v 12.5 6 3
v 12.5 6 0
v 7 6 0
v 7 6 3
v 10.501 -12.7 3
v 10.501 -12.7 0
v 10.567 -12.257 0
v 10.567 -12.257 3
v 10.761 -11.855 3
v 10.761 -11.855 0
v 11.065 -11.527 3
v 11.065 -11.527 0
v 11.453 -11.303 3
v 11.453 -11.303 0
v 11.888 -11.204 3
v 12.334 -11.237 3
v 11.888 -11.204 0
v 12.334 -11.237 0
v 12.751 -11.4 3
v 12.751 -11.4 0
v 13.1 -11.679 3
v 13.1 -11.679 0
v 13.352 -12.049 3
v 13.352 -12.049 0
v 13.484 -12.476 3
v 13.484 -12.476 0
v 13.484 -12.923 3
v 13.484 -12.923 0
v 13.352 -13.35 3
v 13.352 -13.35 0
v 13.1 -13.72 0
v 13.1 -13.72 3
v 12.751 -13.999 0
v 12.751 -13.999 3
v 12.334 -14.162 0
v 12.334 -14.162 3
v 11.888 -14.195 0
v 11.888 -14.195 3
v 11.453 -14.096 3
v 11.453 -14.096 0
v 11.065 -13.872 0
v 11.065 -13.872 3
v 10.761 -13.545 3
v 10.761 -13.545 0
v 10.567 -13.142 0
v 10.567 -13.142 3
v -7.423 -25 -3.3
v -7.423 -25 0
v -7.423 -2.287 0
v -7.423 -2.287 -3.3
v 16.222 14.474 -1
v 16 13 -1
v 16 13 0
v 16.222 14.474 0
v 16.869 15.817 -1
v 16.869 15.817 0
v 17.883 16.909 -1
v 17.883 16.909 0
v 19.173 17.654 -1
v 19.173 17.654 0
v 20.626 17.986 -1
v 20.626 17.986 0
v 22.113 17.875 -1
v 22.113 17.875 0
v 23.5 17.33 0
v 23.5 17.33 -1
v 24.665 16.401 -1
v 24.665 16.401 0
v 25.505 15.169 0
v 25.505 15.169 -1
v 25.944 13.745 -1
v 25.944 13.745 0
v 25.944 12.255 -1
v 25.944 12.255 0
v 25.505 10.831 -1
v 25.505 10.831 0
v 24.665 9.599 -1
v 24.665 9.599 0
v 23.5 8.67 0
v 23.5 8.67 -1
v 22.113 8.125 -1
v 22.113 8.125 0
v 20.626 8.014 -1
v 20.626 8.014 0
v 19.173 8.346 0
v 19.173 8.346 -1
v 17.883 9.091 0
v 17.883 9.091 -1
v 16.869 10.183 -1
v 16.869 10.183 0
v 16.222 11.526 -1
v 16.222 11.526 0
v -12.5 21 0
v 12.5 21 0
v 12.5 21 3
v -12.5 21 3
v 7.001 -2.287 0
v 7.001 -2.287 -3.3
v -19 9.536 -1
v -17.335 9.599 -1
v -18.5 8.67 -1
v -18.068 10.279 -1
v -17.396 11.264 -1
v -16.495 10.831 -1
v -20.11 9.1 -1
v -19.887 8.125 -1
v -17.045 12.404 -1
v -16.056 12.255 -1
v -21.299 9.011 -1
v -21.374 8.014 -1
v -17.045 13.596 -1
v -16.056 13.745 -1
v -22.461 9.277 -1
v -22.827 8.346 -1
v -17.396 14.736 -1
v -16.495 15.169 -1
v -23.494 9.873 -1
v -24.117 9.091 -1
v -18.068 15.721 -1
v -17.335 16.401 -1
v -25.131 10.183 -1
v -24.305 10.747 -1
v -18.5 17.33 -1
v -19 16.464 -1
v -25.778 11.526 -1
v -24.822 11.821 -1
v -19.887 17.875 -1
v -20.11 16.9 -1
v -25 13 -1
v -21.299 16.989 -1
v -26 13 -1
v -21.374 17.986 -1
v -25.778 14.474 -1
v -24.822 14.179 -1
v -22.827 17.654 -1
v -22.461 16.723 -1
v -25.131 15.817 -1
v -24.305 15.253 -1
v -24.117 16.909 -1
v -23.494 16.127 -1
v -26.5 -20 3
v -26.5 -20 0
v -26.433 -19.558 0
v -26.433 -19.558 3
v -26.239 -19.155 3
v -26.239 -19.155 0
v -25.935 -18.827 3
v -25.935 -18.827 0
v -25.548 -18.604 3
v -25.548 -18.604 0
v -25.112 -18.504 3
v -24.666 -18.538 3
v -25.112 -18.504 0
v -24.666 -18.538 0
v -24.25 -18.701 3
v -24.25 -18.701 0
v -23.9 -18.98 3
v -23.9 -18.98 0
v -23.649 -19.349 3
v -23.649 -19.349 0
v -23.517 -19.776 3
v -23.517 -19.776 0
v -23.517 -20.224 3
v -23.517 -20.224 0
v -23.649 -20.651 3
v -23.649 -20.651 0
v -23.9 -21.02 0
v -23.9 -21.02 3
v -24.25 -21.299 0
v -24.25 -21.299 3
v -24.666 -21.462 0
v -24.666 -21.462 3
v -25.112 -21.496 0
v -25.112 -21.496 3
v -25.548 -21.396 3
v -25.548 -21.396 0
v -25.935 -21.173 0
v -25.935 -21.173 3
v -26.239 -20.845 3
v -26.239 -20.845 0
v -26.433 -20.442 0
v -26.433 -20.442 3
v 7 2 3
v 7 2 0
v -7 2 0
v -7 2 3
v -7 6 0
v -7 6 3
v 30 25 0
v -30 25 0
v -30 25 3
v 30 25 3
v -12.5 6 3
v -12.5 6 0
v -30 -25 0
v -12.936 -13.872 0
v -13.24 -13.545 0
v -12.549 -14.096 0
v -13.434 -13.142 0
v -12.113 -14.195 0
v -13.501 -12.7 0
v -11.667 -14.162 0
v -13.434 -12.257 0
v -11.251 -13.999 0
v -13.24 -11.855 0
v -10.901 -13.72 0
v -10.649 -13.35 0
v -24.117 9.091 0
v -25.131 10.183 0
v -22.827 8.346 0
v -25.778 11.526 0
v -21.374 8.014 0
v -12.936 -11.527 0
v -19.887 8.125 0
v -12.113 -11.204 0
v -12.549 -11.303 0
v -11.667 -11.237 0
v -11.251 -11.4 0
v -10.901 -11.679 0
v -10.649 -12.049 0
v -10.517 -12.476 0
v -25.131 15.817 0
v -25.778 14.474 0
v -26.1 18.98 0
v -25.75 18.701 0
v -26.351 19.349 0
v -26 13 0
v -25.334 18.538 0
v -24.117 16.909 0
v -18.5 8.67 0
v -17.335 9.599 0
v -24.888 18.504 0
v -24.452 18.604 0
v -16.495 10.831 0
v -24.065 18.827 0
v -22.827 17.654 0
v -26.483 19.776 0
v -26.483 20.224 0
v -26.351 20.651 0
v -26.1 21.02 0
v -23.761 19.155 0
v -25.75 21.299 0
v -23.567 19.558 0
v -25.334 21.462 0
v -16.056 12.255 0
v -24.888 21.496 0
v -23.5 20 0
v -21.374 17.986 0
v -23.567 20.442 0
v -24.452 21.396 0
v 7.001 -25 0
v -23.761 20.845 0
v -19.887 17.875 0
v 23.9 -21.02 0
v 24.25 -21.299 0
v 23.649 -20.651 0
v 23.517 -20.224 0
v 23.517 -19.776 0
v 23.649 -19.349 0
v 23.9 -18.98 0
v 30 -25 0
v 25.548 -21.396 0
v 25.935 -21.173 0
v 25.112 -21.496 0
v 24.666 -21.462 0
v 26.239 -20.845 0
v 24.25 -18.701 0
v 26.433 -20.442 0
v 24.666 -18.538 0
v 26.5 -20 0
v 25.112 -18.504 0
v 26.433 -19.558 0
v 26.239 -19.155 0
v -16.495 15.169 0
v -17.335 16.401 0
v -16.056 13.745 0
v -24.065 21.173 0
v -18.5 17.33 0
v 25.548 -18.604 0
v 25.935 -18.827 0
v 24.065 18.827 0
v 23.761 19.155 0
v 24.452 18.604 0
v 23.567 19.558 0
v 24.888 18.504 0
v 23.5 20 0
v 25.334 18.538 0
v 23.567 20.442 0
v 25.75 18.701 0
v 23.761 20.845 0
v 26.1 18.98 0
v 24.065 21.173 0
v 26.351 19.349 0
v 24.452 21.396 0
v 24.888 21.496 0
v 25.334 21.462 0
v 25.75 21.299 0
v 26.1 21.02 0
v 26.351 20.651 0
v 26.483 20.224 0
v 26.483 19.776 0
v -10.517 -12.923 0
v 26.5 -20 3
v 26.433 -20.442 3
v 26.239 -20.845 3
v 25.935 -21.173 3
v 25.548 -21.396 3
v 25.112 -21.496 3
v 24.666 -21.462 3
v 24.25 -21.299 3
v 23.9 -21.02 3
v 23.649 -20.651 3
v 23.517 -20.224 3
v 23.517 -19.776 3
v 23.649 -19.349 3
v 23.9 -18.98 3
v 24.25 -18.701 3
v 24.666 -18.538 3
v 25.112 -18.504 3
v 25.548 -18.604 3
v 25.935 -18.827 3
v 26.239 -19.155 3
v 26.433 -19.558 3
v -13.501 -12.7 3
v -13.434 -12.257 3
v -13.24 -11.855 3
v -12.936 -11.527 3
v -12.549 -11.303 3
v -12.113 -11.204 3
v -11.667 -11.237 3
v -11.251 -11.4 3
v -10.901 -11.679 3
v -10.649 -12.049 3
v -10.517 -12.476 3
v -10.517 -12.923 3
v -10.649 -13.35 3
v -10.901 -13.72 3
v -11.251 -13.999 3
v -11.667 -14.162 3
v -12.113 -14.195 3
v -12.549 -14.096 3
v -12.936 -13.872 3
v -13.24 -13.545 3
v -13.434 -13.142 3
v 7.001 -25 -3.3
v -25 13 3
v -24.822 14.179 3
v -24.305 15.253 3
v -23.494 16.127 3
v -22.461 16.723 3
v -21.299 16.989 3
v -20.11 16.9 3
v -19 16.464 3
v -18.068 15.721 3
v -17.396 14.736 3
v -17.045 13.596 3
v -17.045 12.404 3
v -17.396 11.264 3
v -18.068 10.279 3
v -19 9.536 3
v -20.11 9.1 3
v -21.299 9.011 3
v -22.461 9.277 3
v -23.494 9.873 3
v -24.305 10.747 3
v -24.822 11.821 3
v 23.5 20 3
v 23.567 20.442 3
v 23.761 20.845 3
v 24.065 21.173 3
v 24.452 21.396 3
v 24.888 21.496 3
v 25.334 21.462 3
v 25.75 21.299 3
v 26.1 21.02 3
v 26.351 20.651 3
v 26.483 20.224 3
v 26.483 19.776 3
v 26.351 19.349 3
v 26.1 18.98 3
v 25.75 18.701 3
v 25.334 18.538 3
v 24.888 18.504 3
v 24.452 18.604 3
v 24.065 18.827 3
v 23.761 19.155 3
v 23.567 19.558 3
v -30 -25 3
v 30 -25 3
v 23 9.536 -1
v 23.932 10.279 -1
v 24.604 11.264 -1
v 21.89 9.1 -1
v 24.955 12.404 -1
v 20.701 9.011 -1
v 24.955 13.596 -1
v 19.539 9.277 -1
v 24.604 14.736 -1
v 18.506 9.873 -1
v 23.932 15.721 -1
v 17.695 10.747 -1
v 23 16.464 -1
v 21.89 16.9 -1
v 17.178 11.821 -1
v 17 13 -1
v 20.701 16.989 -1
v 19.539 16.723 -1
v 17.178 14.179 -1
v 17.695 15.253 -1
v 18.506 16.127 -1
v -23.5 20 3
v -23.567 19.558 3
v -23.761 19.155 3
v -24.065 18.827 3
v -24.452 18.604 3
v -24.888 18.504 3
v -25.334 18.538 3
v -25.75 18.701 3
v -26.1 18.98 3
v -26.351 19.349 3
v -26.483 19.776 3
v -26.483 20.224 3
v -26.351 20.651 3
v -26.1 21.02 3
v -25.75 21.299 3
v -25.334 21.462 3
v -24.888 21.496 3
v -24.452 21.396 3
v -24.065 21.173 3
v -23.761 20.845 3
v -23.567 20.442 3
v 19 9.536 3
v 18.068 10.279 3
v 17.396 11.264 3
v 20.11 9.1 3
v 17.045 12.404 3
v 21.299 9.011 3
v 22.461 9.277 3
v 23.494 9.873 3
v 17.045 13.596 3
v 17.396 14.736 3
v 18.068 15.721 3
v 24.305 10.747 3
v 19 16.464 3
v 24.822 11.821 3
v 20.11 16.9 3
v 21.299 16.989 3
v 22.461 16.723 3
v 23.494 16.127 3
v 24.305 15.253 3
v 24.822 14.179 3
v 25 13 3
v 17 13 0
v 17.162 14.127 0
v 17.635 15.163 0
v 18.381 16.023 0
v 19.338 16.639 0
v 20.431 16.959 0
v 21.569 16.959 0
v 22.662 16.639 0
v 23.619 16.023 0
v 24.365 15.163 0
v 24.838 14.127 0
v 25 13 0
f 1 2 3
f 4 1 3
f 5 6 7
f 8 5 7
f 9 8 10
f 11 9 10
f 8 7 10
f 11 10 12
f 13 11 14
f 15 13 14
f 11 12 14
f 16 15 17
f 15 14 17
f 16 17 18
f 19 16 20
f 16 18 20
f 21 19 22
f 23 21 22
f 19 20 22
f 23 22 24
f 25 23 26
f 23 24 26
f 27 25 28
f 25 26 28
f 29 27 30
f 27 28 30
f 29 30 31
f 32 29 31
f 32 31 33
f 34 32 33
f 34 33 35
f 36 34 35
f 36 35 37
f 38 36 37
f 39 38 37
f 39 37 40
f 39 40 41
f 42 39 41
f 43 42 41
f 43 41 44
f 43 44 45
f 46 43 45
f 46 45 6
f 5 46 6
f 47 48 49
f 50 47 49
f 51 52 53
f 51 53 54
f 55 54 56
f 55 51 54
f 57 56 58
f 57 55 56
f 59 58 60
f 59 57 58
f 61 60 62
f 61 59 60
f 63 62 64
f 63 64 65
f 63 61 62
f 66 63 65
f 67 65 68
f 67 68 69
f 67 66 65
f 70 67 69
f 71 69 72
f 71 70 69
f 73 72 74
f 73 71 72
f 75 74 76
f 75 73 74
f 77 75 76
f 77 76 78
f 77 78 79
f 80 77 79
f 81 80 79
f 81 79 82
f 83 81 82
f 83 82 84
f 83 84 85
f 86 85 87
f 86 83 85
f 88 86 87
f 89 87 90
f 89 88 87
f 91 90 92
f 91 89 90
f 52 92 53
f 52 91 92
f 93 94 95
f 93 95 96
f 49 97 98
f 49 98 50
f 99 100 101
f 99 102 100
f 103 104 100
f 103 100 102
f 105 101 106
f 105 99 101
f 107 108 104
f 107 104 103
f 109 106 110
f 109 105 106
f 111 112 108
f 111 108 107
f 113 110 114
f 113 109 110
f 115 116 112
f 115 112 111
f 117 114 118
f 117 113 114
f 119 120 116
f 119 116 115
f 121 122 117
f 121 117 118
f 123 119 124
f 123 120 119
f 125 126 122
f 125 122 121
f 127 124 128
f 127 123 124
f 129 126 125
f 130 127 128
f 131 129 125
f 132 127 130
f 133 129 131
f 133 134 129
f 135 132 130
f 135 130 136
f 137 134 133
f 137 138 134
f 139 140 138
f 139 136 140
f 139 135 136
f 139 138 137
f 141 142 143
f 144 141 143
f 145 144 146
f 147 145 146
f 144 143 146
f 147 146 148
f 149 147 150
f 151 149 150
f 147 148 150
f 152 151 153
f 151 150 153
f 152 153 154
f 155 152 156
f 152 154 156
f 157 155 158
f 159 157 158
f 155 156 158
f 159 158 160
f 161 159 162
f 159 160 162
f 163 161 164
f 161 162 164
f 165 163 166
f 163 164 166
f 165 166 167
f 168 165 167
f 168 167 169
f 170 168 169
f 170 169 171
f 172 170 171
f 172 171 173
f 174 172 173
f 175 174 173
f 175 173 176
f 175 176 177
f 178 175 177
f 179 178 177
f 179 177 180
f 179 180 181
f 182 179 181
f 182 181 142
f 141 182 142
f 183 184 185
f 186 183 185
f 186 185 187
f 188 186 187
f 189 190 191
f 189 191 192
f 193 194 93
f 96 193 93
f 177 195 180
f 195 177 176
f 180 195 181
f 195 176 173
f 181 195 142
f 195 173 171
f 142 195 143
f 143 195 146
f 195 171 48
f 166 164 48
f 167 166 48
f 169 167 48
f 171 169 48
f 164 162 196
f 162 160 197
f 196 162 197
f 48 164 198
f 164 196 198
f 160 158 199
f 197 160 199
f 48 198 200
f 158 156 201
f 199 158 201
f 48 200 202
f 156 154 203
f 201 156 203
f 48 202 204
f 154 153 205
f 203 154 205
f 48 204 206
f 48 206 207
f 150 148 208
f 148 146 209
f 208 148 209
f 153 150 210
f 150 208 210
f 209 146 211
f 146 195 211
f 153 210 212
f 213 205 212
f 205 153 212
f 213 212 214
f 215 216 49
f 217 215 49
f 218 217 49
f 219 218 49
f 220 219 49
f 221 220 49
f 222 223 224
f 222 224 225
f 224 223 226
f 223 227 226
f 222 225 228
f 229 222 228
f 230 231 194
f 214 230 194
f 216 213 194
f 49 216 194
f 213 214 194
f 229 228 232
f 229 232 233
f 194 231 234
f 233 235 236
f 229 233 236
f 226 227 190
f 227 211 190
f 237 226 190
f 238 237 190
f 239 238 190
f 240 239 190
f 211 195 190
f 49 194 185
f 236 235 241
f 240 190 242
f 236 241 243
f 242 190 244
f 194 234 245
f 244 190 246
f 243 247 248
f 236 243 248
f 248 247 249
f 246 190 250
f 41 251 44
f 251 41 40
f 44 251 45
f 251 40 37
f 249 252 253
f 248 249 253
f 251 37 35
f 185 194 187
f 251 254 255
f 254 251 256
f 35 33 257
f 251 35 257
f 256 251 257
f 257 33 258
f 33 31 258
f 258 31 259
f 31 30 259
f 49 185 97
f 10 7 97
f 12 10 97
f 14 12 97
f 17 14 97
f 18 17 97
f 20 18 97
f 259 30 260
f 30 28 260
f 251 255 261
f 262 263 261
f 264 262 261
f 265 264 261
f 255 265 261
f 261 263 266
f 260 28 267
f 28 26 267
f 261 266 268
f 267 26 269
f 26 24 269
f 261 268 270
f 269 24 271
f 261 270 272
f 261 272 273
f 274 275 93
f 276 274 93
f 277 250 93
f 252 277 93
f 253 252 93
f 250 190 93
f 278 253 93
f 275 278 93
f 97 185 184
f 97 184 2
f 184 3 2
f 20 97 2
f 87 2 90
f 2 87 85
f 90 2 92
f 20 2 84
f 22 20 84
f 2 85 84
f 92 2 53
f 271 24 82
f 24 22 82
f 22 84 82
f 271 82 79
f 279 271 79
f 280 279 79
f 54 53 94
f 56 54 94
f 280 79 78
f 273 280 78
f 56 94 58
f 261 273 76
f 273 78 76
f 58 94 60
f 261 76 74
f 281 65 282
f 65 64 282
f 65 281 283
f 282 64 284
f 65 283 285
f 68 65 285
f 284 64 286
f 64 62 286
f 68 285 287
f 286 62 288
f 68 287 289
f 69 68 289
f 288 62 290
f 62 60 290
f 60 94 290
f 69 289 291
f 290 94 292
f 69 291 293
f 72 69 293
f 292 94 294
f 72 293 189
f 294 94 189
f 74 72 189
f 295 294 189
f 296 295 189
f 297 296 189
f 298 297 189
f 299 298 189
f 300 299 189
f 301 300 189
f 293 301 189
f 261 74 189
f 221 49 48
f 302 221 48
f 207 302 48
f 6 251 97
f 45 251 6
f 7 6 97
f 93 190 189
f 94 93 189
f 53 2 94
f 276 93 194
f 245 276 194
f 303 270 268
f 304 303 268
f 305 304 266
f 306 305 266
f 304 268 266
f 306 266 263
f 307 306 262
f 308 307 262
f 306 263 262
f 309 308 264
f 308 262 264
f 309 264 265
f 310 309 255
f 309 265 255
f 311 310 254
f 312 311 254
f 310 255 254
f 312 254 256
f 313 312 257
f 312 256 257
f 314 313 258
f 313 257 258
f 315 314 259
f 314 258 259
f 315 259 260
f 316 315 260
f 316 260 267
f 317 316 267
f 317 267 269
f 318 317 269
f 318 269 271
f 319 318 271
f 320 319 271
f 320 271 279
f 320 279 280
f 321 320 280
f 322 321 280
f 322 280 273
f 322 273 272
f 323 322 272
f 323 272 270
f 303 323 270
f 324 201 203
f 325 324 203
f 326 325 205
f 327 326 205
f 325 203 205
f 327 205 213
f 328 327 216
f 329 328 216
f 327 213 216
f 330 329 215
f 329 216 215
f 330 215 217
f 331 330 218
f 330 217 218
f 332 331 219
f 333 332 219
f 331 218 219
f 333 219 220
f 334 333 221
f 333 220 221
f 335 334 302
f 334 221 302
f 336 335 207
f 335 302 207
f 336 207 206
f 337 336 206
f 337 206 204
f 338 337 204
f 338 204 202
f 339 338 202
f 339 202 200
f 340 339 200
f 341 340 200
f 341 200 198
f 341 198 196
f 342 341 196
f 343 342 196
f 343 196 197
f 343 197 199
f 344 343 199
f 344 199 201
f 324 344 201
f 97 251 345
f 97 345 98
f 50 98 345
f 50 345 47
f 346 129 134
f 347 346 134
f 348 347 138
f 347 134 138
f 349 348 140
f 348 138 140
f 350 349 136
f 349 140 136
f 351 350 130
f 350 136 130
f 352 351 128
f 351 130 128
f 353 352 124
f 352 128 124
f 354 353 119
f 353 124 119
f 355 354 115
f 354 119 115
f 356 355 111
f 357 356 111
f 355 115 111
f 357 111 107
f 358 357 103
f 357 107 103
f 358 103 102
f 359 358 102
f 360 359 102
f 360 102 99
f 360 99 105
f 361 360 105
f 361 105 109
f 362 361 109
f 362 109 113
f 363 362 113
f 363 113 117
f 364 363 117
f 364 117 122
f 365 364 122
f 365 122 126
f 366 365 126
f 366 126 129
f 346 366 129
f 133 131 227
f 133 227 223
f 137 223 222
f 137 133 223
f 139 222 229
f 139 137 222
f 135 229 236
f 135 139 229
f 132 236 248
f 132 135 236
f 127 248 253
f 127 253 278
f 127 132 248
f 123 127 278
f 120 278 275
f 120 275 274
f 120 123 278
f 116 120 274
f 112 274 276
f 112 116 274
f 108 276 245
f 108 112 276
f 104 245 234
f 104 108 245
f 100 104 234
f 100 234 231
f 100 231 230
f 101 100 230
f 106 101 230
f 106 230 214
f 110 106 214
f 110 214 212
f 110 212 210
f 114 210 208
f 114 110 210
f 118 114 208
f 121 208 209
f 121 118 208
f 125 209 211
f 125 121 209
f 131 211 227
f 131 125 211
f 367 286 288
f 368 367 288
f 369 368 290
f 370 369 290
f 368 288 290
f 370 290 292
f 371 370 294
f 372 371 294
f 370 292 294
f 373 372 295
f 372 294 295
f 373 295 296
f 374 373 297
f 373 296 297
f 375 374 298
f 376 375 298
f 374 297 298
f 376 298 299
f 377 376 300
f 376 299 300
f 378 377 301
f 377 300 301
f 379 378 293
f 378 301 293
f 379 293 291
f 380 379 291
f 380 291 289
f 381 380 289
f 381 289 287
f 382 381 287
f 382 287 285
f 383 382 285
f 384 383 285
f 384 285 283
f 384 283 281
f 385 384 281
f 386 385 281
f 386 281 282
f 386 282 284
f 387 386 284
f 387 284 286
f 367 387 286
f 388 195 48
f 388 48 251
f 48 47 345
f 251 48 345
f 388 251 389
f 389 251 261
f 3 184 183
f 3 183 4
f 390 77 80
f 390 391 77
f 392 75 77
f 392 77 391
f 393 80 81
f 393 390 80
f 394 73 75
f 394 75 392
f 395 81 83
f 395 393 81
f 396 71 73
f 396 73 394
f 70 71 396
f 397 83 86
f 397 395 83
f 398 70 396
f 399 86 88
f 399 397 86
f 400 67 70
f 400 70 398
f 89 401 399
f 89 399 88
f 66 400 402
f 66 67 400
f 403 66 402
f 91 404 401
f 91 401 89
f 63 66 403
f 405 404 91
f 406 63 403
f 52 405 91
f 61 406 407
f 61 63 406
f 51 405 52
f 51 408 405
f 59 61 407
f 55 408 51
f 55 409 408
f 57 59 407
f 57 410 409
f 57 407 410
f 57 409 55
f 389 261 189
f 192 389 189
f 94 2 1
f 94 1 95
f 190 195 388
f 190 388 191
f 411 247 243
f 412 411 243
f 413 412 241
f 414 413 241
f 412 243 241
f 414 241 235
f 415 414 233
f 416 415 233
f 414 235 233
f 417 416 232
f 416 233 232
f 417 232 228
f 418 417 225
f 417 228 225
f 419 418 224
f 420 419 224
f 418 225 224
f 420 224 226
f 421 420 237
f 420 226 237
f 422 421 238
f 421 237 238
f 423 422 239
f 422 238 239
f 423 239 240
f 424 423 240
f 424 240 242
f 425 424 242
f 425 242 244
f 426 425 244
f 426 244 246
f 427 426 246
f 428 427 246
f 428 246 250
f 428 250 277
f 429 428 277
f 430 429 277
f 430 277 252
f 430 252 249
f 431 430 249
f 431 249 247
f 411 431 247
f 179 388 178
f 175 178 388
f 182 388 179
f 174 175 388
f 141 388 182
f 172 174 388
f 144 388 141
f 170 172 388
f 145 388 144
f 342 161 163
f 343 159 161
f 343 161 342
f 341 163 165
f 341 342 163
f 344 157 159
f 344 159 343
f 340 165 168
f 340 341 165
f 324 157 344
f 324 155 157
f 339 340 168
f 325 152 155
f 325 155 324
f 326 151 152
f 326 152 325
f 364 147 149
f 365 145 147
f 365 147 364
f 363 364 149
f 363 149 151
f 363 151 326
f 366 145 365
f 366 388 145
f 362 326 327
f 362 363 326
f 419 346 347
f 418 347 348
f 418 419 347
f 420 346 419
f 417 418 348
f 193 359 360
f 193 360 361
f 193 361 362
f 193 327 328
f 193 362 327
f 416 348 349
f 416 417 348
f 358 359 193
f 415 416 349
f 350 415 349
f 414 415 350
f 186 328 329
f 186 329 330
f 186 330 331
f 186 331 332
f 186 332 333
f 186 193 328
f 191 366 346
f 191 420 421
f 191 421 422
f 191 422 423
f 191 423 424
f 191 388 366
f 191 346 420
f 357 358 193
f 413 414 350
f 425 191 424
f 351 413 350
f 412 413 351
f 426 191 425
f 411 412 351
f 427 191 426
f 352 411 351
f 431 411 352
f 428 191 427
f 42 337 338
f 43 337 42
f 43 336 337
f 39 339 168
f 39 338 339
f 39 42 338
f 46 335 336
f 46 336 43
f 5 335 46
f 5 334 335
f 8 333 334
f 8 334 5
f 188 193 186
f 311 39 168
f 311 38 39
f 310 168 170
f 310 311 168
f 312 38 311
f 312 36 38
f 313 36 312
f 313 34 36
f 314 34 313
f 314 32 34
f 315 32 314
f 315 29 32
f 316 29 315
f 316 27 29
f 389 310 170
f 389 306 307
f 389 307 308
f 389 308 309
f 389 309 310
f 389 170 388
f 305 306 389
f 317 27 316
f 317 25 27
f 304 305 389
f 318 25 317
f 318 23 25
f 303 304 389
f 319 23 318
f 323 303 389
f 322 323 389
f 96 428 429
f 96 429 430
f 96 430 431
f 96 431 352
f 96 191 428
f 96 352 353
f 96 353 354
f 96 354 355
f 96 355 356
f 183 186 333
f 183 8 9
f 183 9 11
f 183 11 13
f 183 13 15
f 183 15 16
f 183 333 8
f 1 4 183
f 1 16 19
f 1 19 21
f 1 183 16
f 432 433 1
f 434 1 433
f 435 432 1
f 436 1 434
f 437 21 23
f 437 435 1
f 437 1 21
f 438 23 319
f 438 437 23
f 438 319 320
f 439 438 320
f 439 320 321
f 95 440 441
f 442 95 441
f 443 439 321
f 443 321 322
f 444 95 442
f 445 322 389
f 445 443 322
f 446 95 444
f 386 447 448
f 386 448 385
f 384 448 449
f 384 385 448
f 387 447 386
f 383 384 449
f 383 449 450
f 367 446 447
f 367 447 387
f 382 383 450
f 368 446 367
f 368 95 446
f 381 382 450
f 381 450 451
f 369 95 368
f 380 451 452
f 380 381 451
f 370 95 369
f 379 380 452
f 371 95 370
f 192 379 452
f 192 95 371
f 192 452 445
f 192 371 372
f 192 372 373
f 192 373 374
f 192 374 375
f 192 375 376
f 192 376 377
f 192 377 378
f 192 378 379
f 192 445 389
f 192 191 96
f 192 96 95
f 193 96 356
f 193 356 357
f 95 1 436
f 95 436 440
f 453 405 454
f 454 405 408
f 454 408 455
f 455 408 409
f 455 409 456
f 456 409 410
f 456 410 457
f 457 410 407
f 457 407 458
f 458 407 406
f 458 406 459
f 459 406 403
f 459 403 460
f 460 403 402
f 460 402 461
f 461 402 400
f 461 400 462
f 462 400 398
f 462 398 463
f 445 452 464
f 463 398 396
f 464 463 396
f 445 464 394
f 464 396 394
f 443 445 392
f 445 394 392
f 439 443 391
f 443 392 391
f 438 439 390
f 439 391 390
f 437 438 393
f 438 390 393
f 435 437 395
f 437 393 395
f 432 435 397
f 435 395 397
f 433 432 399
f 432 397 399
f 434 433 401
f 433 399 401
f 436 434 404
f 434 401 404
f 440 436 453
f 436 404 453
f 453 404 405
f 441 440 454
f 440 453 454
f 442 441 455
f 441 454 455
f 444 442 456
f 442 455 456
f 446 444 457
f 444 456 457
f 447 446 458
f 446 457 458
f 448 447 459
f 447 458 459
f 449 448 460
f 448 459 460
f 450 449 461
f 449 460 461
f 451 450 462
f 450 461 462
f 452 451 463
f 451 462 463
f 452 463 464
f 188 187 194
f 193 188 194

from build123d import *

# Parameters (mm, degrees)
SKETCH1_W           = 60
SKETCH1_H           = 50
BOSS_EXTRUDE1_DEPTH = 3
SKETCH2_R           = 4
CUT_EXTRUDE1_DEPTH  = 40.166312055
BOSS_EXTRUDE2_START = 1
SKETCH3_R           = 5
SKETCH3_R_2         = 4
BOSS_EXTRUDE2_DEPTH = 1
SKETCH4_W           = 25
SKETCH4_H           = 15
CUT_EXTRUDE2_DEPTH  = 40.166312055
SKETCH5_W           = 14
SKETCH5_H           = 4
CUT_EXTRUDE3_DEPTH  = 40.166312055
SKETCH6_W           = 14.423290477
SKETCH6_H           = 22.713380778
BOSS_EXTRUDE3_DEPTH = 3.3
SKETCH8_R           = 1.5
CUT_EXTRUDE4_DEPTH  = 40.190432506
SKETCH9_R           = 1.5
CUT_EXTRUDE5_DEPTH  = 10


with BuildPart() as part:
    # Sketch1 → Boss-Extrude1 (new body)
    with BuildSketch(Plane.XY):
        Rectangle(SKETCH1_W, SKETCH1_H)
    extrude(amount=BOSS_EXTRUDE1_DEPTH)

    # Sketch2 → Cut-Extrude1 (cut, through all)
    with BuildSketch(Plane(origin=(0, 0, 0), x_dir=(-1, 0, 0), z_dir=(0, 0, -1))):
        with Locations((21, 13)):
            Circle(SKETCH2_R)
        with Locations(Location((-21, 13, 0), (0, 0, 180))):
            Circle(SKETCH2_R)
    extrude(amount=-CUT_EXTRUDE1_DEPTH, mode=Mode.SUBTRACT)

    # Sketch3 → Boss-Extrude2 (add)
    # profile 1 of 2: a face of its own
    with BuildSketch(Plane(origin=(0, 0, 0), x_dir=(-1, 0, 0), z_dir=(0, 0, -1)).offset(BOSS_EXTRUDE2_START)):
        with Locations((21, 13)):
            Circle(SKETCH3_R)
        with Locations((21, 13)):
            Circle(SKETCH3_R_2, mode=Mode.SUBTRACT)
    # profile 2 of 2: a face of its own
    with BuildSketch(Plane(origin=(0, 0, 0), x_dir=(-1, 0, 0), z_dir=(0, 0, -1)).offset(BOSS_EXTRUDE2_START)):
        with Locations((-21, 13)):
            Circle(SKETCH3_R)
        with Locations((-21, 13)):
            Circle(SKETCH3_R_2, mode=Mode.SUBTRACT)
    extrude(amount=-BOSS_EXTRUDE2_DEPTH)

    # Sketch4 → Cut-Extrude2 (cut, through all)
    with BuildSketch(Plane(origin=(0, 0, 0), x_dir=(-1, 0, 0), z_dir=(0, 0, -1))):
        with Locations((0, 13.5)):
            Rectangle(SKETCH4_W, SKETCH4_H)
    extrude(amount=-CUT_EXTRUDE2_DEPTH, mode=Mode.SUBTRACT)

    # Sketch5 → Cut-Extrude3 (cut, through all)
    with BuildSketch(Plane(origin=(0, 0, 0), x_dir=(-1, 0, 0), z_dir=(0, 0, -1))):
        with Locations((0, 4)):
            Rectangle(SKETCH5_W, SKETCH5_H)
    extrude(amount=-CUT_EXTRUDE3_DEPTH, mode=Mode.SUBTRACT)

    # Sketch6 → Boss-Extrude3 (add)
    with BuildSketch(Plane(origin=(0, 0, 0), x_dir=(-1, 0, 0), z_dir=(0, 0, -1))):
        with Locations((0.211072543, -13.643309611)):
            Rectangle(SKETCH6_W, SKETCH6_H)
    extrude(amount=BOSS_EXTRUDE3_DEPTH)

    # Sketch8 → Cut-Extrude4 (cut, through all)
    with BuildSketch(Plane(origin=(0, 0, 0), x_dir=(-1, 0, 0), z_dir=(0, 0, -1))):
        with Locations((-25, 20)):
            Circle(SKETCH8_R)
        with Locations(Location((-25, -20, 0), (0, 0, 180))):
            Circle(SKETCH8_R)
        with Locations((25, -20)):
            Circle(SKETCH8_R)
        with Locations(Location((25, 20, 0), (0, 0, 180))):
            Circle(SKETCH8_R)
    extrude(amount=-CUT_EXTRUDE4_DEPTH, mode=Mode.SUBTRACT)

    # Sketch9 → Cut-Extrude5 (cut)
    with BuildSketch(Plane(origin=(0, 0, 0), x_dir=(-1, 0, 0), z_dir=(0, 0, -1))):
        with Locations((-12.000572695, -12.699531371)):
            Circle(SKETCH9_R)
        with Locations((12.000572695, -12.699531371)):
            Circle(SKETCH9_R)
    extrude(amount=-CUT_EXTRUDE5_DEPTH, mode=Mode.SUBTRACT)


solid = part.part
